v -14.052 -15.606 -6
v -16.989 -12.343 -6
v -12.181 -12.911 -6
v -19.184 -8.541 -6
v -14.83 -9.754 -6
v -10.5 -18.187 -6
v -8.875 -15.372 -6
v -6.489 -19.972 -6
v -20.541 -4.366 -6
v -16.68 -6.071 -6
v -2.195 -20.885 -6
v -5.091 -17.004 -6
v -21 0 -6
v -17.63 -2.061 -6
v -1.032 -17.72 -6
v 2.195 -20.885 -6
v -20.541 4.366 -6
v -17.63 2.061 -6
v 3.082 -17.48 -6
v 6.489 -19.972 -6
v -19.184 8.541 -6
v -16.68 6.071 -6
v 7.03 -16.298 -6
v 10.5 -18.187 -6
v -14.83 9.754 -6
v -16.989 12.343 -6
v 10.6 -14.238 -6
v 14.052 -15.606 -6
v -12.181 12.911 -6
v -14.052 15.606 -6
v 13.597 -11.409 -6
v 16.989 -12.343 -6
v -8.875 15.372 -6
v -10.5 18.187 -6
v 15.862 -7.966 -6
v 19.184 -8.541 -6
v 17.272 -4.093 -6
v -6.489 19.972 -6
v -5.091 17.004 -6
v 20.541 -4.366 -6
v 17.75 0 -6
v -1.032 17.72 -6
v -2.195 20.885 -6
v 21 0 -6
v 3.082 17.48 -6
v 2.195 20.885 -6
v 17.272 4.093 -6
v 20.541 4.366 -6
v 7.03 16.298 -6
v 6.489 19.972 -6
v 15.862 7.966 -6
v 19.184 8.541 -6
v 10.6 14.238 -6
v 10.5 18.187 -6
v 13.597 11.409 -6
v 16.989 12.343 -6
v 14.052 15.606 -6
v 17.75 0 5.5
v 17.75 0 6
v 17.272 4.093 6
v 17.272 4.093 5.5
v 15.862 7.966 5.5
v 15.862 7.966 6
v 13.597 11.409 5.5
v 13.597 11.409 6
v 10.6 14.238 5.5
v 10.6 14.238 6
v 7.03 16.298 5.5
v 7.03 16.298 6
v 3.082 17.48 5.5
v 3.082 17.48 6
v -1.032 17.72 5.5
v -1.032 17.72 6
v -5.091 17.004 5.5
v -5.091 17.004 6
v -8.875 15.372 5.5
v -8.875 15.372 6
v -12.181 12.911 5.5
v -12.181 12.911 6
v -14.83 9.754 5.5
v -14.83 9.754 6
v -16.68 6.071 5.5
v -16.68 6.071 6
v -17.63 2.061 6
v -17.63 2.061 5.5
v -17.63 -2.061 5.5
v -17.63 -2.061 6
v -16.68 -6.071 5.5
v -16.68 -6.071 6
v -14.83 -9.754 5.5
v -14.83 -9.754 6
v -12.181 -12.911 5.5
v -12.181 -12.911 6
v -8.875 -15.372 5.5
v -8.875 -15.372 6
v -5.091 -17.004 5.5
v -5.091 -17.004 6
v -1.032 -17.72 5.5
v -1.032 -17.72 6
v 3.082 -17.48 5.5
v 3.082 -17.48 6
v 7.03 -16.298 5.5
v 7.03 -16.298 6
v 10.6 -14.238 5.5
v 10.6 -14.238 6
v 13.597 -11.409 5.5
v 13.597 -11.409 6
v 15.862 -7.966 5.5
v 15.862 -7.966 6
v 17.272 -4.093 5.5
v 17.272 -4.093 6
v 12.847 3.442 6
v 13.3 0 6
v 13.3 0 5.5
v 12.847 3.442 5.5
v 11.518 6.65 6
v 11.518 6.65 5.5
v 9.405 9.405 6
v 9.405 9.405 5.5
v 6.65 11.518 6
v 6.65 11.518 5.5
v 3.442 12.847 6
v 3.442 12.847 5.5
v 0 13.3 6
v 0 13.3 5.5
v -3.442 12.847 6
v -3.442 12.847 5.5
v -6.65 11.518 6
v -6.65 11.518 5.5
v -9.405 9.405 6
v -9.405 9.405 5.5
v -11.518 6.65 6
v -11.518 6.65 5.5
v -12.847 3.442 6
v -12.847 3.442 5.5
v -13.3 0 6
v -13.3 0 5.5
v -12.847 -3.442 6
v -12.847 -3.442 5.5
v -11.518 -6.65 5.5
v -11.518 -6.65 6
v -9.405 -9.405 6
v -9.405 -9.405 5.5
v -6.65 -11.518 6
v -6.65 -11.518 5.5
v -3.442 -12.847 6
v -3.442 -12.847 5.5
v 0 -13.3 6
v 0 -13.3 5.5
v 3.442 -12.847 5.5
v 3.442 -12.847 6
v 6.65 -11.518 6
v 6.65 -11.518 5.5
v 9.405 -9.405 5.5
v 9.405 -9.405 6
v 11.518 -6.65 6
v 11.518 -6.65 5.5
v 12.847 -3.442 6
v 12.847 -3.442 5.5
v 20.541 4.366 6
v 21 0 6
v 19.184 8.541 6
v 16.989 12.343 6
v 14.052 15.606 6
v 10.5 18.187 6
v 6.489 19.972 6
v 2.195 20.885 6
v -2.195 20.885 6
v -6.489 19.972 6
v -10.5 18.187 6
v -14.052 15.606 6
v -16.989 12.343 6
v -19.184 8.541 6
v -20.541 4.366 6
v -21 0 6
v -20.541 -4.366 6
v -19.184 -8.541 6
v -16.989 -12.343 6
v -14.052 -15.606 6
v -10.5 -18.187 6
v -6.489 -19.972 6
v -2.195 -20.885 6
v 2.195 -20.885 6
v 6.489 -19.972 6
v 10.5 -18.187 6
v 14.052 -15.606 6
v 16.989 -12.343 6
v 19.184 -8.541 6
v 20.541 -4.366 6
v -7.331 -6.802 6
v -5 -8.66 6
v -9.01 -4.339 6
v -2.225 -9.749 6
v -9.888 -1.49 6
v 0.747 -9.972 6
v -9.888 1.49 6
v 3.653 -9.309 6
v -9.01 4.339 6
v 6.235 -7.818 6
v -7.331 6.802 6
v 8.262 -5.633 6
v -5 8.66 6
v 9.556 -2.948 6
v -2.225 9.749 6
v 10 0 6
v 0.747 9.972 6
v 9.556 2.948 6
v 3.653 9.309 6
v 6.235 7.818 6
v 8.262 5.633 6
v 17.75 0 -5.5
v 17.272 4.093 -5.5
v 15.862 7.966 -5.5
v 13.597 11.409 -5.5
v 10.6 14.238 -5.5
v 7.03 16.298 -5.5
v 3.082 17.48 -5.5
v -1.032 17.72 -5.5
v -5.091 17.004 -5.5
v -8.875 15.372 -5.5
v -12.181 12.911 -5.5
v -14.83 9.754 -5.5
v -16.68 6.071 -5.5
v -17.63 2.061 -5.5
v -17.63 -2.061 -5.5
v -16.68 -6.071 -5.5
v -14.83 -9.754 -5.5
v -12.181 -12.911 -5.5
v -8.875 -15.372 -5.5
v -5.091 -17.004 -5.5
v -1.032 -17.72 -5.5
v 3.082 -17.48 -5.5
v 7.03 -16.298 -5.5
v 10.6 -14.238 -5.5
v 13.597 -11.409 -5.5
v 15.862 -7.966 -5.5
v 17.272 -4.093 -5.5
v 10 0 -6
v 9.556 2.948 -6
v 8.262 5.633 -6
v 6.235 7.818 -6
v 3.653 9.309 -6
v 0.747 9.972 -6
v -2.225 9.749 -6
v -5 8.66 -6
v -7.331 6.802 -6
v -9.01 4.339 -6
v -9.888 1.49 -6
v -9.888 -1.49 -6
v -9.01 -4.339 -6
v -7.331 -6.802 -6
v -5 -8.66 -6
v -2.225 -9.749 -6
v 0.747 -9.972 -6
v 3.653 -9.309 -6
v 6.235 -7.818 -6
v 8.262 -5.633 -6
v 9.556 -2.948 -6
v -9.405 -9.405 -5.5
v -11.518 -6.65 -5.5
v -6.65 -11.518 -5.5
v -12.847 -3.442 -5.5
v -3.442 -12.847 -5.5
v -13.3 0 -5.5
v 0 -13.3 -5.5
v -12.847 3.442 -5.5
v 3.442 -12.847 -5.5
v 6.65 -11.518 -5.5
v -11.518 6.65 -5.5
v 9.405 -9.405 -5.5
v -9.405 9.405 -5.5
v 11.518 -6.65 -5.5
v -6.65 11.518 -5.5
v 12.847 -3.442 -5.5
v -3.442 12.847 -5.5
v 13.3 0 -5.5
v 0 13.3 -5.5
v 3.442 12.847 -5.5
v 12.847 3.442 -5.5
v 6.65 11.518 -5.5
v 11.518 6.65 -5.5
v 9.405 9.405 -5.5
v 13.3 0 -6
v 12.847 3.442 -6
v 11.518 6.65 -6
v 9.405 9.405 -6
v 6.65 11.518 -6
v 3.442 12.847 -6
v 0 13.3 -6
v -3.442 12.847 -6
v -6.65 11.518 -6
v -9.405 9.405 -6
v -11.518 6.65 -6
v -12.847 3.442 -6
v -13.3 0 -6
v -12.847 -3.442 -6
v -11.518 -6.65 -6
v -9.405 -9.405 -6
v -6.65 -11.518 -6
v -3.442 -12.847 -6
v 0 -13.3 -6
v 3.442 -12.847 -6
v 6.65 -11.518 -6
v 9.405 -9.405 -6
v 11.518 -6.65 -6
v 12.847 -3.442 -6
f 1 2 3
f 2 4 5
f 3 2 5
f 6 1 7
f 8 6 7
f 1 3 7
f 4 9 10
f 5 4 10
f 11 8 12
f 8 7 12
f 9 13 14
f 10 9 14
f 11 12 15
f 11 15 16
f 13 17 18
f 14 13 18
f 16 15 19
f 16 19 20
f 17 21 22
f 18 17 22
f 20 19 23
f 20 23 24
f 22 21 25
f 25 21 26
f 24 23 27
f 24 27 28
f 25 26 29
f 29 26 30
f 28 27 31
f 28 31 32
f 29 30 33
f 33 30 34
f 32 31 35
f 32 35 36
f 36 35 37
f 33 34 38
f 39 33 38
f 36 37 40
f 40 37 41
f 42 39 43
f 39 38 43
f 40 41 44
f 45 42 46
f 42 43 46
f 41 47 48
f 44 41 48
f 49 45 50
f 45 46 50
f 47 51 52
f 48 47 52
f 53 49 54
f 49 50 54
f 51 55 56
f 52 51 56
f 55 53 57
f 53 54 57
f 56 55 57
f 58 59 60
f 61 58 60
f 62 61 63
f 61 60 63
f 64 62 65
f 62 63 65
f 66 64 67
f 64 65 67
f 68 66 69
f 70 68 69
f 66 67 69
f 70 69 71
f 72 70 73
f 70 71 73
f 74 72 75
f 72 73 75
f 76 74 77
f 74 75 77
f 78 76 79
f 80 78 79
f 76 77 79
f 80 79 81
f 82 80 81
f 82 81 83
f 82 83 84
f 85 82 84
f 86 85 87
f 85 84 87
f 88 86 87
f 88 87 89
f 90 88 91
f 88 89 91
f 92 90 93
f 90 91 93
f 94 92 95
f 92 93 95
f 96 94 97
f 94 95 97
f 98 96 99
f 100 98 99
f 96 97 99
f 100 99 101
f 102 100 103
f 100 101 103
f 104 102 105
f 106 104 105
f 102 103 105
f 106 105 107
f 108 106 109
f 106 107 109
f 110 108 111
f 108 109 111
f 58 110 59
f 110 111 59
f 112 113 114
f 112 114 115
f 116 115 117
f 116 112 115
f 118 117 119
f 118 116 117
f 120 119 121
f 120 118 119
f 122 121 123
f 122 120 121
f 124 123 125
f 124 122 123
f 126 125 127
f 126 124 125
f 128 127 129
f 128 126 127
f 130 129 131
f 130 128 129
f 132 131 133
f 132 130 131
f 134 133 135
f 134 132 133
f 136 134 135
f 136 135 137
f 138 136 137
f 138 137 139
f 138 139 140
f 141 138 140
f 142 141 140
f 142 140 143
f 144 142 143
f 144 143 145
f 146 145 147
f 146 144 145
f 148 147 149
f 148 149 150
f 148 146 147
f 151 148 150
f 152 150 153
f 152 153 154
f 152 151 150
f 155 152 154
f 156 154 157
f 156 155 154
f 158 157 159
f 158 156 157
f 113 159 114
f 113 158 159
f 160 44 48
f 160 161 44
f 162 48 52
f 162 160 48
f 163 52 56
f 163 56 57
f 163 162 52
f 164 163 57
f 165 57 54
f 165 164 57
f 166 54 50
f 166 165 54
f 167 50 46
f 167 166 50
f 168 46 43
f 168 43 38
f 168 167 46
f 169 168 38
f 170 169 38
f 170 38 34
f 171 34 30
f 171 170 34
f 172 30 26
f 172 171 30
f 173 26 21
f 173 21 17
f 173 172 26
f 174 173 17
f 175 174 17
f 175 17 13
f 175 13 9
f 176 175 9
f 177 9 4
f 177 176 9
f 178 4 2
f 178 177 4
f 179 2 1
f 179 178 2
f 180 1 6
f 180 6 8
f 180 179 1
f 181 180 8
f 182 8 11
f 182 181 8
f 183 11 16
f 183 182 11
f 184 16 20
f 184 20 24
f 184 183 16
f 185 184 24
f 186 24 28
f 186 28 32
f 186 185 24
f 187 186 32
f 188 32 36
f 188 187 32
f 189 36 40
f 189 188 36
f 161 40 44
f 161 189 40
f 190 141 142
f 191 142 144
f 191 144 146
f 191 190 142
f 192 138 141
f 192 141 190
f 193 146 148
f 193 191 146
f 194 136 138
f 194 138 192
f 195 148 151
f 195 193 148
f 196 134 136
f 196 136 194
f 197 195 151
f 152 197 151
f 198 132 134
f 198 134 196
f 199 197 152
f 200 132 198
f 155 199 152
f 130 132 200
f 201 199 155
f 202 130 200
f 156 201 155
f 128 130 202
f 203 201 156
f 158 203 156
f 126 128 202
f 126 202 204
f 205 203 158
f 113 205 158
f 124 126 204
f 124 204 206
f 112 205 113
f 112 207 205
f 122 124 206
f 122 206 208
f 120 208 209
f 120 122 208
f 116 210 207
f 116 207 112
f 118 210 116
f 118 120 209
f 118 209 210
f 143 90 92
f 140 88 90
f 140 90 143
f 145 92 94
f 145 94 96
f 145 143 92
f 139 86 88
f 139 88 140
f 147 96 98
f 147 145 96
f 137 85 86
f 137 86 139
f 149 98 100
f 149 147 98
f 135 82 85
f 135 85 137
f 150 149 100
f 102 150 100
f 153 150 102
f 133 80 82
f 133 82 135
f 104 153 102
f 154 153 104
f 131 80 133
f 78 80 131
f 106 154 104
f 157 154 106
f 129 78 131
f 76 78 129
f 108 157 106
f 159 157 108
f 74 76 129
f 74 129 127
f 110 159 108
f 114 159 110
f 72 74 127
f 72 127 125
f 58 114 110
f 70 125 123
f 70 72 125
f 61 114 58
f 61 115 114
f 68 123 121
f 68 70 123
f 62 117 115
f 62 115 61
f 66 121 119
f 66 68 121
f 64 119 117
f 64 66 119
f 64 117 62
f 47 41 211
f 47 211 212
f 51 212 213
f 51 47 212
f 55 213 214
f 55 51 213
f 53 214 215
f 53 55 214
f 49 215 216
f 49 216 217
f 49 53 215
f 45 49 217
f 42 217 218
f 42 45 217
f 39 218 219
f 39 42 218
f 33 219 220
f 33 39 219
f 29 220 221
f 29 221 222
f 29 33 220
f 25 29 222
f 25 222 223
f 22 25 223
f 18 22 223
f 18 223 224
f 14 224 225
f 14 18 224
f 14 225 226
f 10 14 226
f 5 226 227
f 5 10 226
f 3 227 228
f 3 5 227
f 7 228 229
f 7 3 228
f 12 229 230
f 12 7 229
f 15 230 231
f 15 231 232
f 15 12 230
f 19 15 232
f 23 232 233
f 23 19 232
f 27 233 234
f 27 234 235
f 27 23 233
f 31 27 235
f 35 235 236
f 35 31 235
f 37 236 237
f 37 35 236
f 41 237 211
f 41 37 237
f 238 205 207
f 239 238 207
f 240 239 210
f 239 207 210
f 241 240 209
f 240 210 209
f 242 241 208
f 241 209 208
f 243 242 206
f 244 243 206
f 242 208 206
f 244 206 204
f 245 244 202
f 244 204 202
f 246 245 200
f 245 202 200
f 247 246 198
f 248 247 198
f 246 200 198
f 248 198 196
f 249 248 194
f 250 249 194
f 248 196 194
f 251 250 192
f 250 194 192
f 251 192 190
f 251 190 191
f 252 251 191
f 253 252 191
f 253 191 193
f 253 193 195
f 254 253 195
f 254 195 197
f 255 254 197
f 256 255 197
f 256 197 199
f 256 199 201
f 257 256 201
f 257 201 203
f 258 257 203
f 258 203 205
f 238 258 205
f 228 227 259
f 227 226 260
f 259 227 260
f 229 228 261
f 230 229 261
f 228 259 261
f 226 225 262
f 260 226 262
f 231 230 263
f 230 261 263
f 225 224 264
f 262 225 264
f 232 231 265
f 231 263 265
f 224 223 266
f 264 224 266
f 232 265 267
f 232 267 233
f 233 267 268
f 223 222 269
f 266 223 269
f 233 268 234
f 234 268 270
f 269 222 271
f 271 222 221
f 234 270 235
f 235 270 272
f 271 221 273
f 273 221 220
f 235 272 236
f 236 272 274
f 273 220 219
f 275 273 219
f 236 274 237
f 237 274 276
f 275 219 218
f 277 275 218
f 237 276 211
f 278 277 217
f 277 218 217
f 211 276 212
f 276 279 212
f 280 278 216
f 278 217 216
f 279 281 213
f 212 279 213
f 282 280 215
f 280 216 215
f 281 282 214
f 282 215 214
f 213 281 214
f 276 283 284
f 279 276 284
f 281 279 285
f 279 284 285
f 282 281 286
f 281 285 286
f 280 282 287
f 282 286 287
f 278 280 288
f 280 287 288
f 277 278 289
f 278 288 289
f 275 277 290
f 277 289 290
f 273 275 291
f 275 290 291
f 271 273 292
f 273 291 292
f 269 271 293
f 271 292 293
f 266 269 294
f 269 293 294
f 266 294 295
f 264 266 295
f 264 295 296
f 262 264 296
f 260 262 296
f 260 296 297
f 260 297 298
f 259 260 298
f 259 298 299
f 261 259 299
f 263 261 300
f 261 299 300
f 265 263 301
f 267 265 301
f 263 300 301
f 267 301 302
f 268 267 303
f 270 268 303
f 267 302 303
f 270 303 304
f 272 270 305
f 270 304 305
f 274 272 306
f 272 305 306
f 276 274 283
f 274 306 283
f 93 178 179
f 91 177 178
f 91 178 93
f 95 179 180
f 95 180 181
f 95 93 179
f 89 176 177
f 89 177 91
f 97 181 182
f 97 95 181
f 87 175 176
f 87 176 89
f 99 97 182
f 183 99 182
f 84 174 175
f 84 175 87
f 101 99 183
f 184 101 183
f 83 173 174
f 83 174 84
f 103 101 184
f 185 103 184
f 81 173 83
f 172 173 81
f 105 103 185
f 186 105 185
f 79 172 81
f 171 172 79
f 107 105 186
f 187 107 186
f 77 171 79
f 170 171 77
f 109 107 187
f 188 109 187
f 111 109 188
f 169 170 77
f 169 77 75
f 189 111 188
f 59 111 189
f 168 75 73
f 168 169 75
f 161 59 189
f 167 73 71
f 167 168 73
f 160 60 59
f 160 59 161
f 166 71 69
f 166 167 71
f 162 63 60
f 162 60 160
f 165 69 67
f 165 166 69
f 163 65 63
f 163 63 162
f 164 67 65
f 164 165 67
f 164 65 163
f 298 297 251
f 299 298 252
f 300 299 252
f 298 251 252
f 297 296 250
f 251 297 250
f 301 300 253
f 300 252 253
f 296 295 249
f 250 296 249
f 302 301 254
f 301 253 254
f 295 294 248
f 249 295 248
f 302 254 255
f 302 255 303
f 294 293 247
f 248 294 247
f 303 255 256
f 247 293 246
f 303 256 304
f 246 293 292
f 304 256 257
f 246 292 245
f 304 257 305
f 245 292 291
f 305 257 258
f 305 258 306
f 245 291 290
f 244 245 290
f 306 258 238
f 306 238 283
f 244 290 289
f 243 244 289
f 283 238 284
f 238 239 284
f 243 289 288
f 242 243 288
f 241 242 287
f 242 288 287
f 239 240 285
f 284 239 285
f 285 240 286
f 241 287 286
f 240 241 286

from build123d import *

# Parameters (mm, degrees)
SKETCH_1_R          = 21
EXTRUDE_1_DEPTH     = 6
SKETCH_3_R          = 10
CUT_EXTRUDE_1_DEPTH = 13
SKETCH_2_R          = 17.75
SKETCH_2_R_2        = 13.3
CUT_EXTRUDE_2_DEPTH = 0.5


with BuildPart() as part:
    # 草圖1 → 填料-伸長1 (new body, symmetric)
    with BuildSketch(Plane.XY):
        Circle(SKETCH_1_R)
    extrude(amount=EXTRUDE_1_DEPTH, both=True)

    # 草圖3 → 除料-伸長1 (cut, through all)
    with BuildSketch(Plane.XY.offset(6)):
        Circle(SKETCH_3_R)
    extrude(amount=-CUT_EXTRUDE_1_DEPTH, mode=Mode.SUBTRACT)

    # 草圖2 → 除料-伸長2 (cut)
    with BuildSketch(Plane.XY.offset(6)):
        Circle(SKETCH_2_R)
        Circle(SKETCH_2_R_2, mode=Mode.SUBTRACT)
    cut_extrude_2 = extrude(amount=-CUT_EXTRUDE_2_DEPTH, mode=Mode.SUBTRACT)

    # 鏡射1: 除料-伸長2 across plane
    add(cut_extrude_2.mirror(Plane.XY), mode=Mode.SUBTRACT)


solid = part.part
